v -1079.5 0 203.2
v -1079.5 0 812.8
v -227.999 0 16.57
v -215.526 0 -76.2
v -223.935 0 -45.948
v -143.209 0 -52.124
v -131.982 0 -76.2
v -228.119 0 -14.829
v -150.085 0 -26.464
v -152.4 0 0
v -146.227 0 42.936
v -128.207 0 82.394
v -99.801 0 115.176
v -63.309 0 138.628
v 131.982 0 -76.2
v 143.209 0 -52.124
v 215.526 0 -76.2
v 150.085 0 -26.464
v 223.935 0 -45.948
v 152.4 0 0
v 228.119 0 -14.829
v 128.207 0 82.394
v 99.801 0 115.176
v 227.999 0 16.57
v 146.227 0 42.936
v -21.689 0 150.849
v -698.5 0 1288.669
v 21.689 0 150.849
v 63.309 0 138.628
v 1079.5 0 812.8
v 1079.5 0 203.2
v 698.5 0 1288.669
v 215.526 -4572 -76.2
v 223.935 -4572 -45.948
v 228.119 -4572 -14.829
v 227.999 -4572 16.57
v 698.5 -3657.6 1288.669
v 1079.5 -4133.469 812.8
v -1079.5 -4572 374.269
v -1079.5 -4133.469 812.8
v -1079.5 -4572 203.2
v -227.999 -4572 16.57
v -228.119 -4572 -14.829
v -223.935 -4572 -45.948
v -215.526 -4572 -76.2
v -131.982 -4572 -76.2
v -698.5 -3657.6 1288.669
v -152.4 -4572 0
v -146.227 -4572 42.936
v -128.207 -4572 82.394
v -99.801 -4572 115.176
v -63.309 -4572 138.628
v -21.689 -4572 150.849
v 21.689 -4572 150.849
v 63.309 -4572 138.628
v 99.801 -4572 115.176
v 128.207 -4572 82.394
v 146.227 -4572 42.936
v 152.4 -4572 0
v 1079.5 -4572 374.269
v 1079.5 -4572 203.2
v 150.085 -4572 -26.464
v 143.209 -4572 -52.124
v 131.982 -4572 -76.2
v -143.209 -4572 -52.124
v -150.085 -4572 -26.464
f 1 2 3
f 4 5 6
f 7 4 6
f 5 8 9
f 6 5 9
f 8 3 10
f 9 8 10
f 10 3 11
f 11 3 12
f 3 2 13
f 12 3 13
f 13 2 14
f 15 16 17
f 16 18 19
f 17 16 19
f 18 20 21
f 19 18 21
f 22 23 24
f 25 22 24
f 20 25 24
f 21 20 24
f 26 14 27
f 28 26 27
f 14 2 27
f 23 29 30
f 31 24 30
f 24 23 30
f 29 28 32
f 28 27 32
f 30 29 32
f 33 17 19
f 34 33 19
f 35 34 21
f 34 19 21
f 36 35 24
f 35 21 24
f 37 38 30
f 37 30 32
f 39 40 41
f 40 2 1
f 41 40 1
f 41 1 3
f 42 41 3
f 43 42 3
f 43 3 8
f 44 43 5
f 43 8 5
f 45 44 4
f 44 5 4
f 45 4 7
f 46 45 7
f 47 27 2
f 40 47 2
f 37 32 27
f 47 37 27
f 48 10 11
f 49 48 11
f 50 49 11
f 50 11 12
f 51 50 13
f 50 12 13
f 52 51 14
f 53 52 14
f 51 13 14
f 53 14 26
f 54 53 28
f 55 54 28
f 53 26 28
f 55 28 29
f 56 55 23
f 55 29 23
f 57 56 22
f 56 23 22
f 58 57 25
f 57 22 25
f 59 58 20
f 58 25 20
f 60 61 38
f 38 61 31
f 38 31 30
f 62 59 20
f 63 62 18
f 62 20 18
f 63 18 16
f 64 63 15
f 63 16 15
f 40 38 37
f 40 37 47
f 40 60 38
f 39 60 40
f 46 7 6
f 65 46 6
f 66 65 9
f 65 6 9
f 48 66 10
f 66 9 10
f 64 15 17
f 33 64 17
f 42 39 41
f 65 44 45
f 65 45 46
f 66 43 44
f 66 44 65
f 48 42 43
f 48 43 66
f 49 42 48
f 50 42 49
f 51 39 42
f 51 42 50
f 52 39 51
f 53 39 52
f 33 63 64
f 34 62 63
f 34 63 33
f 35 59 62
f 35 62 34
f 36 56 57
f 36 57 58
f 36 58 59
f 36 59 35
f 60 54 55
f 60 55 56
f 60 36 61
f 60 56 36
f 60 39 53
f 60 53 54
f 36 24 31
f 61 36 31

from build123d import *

# Parameters (mm, degrees)
F0_W     = 304.8
F0_H     = 304.8
F1_DEPTH = 4572
F2_SIZE  = 914.4


with BuildPart() as f1:
    # F0 (on Front) → F1 (new body)
    with BuildSketch(Plane.XZ):
        Polygon((-1079.5, 812.8), (1079.5, 812.8), (698.5, 1288.668847478), (-698.5, 1288.668847478), align=None)
        Polygon((152.4, 508), (152.4, 203.2), (1079.5, 203.2), (1079.5, 812.8), (-1079.5, 812.8), (-1079.5, 203.2), (-152.4, 203.2), (-152.4, 508), align=None)
        with Locations((0, 355.6)):
            Rectangle(F0_W, F0_H)
        Polygon((-227.9987040592, 16.5695789719), (-152.4, 0), (-152.4, 203.2), (-1079.5, 203.2), align=None)
        with BuildLine():
            ThreePointArc((-152.4, 0), (0, 152.4), (152.4, 0))
            Line((152.4, 0), (152.4, 203.2))
            Line((152.4, 203.2), (-152.4, 203.2))
            Line((-152.4, 203.2), (-152.4, 0))
        make_face()
        Polygon((152.4, 203.2), (152.4, 0), (227.9987040592, 16.5695789719), (1079.5, 203.2), align=None)
        with BuildLine():
            ThreePointArc((-131.9822715367, -76.2), (-147.2070959265, -39.4440224736), (-152.4, 0))
            Line((-152.4, 0), (-227.9987040592, 16.5695789719))
            ThreePointArc((-227.9987040592, 16.5695789719), (-226.5615193529, -30.4604325065), (-215.5261469057, -76.2))
            Line((-215.5261469057, -76.2), (-131.9822715367, -76.2))
        make_face()
        with BuildLine():
            Line((227.9987040592, 16.5695789719), (152.4, 0))
            ThreePointArc((152.4, 0), (147.2070959265, -39.4440224736), (131.9822715367, -76.2))
            Line((131.9822715367, -76.2), (215.5261469057, -76.2))
            ThreePointArc((215.5261469057, -76.2), (226.5615193529, -30.4604325065), (227.9987040592, 16.5695789719))
        make_face()
    extrude(amount=F1_DEPTH)

    # F2
    f2_edges = [f1.edges().sort_by_distance(p)[0] for p in [
        (0, -4572, 1288.668847),
    ]]
    chamfer(f2_edges, length=F2_SIZE)


solid = f1.part
